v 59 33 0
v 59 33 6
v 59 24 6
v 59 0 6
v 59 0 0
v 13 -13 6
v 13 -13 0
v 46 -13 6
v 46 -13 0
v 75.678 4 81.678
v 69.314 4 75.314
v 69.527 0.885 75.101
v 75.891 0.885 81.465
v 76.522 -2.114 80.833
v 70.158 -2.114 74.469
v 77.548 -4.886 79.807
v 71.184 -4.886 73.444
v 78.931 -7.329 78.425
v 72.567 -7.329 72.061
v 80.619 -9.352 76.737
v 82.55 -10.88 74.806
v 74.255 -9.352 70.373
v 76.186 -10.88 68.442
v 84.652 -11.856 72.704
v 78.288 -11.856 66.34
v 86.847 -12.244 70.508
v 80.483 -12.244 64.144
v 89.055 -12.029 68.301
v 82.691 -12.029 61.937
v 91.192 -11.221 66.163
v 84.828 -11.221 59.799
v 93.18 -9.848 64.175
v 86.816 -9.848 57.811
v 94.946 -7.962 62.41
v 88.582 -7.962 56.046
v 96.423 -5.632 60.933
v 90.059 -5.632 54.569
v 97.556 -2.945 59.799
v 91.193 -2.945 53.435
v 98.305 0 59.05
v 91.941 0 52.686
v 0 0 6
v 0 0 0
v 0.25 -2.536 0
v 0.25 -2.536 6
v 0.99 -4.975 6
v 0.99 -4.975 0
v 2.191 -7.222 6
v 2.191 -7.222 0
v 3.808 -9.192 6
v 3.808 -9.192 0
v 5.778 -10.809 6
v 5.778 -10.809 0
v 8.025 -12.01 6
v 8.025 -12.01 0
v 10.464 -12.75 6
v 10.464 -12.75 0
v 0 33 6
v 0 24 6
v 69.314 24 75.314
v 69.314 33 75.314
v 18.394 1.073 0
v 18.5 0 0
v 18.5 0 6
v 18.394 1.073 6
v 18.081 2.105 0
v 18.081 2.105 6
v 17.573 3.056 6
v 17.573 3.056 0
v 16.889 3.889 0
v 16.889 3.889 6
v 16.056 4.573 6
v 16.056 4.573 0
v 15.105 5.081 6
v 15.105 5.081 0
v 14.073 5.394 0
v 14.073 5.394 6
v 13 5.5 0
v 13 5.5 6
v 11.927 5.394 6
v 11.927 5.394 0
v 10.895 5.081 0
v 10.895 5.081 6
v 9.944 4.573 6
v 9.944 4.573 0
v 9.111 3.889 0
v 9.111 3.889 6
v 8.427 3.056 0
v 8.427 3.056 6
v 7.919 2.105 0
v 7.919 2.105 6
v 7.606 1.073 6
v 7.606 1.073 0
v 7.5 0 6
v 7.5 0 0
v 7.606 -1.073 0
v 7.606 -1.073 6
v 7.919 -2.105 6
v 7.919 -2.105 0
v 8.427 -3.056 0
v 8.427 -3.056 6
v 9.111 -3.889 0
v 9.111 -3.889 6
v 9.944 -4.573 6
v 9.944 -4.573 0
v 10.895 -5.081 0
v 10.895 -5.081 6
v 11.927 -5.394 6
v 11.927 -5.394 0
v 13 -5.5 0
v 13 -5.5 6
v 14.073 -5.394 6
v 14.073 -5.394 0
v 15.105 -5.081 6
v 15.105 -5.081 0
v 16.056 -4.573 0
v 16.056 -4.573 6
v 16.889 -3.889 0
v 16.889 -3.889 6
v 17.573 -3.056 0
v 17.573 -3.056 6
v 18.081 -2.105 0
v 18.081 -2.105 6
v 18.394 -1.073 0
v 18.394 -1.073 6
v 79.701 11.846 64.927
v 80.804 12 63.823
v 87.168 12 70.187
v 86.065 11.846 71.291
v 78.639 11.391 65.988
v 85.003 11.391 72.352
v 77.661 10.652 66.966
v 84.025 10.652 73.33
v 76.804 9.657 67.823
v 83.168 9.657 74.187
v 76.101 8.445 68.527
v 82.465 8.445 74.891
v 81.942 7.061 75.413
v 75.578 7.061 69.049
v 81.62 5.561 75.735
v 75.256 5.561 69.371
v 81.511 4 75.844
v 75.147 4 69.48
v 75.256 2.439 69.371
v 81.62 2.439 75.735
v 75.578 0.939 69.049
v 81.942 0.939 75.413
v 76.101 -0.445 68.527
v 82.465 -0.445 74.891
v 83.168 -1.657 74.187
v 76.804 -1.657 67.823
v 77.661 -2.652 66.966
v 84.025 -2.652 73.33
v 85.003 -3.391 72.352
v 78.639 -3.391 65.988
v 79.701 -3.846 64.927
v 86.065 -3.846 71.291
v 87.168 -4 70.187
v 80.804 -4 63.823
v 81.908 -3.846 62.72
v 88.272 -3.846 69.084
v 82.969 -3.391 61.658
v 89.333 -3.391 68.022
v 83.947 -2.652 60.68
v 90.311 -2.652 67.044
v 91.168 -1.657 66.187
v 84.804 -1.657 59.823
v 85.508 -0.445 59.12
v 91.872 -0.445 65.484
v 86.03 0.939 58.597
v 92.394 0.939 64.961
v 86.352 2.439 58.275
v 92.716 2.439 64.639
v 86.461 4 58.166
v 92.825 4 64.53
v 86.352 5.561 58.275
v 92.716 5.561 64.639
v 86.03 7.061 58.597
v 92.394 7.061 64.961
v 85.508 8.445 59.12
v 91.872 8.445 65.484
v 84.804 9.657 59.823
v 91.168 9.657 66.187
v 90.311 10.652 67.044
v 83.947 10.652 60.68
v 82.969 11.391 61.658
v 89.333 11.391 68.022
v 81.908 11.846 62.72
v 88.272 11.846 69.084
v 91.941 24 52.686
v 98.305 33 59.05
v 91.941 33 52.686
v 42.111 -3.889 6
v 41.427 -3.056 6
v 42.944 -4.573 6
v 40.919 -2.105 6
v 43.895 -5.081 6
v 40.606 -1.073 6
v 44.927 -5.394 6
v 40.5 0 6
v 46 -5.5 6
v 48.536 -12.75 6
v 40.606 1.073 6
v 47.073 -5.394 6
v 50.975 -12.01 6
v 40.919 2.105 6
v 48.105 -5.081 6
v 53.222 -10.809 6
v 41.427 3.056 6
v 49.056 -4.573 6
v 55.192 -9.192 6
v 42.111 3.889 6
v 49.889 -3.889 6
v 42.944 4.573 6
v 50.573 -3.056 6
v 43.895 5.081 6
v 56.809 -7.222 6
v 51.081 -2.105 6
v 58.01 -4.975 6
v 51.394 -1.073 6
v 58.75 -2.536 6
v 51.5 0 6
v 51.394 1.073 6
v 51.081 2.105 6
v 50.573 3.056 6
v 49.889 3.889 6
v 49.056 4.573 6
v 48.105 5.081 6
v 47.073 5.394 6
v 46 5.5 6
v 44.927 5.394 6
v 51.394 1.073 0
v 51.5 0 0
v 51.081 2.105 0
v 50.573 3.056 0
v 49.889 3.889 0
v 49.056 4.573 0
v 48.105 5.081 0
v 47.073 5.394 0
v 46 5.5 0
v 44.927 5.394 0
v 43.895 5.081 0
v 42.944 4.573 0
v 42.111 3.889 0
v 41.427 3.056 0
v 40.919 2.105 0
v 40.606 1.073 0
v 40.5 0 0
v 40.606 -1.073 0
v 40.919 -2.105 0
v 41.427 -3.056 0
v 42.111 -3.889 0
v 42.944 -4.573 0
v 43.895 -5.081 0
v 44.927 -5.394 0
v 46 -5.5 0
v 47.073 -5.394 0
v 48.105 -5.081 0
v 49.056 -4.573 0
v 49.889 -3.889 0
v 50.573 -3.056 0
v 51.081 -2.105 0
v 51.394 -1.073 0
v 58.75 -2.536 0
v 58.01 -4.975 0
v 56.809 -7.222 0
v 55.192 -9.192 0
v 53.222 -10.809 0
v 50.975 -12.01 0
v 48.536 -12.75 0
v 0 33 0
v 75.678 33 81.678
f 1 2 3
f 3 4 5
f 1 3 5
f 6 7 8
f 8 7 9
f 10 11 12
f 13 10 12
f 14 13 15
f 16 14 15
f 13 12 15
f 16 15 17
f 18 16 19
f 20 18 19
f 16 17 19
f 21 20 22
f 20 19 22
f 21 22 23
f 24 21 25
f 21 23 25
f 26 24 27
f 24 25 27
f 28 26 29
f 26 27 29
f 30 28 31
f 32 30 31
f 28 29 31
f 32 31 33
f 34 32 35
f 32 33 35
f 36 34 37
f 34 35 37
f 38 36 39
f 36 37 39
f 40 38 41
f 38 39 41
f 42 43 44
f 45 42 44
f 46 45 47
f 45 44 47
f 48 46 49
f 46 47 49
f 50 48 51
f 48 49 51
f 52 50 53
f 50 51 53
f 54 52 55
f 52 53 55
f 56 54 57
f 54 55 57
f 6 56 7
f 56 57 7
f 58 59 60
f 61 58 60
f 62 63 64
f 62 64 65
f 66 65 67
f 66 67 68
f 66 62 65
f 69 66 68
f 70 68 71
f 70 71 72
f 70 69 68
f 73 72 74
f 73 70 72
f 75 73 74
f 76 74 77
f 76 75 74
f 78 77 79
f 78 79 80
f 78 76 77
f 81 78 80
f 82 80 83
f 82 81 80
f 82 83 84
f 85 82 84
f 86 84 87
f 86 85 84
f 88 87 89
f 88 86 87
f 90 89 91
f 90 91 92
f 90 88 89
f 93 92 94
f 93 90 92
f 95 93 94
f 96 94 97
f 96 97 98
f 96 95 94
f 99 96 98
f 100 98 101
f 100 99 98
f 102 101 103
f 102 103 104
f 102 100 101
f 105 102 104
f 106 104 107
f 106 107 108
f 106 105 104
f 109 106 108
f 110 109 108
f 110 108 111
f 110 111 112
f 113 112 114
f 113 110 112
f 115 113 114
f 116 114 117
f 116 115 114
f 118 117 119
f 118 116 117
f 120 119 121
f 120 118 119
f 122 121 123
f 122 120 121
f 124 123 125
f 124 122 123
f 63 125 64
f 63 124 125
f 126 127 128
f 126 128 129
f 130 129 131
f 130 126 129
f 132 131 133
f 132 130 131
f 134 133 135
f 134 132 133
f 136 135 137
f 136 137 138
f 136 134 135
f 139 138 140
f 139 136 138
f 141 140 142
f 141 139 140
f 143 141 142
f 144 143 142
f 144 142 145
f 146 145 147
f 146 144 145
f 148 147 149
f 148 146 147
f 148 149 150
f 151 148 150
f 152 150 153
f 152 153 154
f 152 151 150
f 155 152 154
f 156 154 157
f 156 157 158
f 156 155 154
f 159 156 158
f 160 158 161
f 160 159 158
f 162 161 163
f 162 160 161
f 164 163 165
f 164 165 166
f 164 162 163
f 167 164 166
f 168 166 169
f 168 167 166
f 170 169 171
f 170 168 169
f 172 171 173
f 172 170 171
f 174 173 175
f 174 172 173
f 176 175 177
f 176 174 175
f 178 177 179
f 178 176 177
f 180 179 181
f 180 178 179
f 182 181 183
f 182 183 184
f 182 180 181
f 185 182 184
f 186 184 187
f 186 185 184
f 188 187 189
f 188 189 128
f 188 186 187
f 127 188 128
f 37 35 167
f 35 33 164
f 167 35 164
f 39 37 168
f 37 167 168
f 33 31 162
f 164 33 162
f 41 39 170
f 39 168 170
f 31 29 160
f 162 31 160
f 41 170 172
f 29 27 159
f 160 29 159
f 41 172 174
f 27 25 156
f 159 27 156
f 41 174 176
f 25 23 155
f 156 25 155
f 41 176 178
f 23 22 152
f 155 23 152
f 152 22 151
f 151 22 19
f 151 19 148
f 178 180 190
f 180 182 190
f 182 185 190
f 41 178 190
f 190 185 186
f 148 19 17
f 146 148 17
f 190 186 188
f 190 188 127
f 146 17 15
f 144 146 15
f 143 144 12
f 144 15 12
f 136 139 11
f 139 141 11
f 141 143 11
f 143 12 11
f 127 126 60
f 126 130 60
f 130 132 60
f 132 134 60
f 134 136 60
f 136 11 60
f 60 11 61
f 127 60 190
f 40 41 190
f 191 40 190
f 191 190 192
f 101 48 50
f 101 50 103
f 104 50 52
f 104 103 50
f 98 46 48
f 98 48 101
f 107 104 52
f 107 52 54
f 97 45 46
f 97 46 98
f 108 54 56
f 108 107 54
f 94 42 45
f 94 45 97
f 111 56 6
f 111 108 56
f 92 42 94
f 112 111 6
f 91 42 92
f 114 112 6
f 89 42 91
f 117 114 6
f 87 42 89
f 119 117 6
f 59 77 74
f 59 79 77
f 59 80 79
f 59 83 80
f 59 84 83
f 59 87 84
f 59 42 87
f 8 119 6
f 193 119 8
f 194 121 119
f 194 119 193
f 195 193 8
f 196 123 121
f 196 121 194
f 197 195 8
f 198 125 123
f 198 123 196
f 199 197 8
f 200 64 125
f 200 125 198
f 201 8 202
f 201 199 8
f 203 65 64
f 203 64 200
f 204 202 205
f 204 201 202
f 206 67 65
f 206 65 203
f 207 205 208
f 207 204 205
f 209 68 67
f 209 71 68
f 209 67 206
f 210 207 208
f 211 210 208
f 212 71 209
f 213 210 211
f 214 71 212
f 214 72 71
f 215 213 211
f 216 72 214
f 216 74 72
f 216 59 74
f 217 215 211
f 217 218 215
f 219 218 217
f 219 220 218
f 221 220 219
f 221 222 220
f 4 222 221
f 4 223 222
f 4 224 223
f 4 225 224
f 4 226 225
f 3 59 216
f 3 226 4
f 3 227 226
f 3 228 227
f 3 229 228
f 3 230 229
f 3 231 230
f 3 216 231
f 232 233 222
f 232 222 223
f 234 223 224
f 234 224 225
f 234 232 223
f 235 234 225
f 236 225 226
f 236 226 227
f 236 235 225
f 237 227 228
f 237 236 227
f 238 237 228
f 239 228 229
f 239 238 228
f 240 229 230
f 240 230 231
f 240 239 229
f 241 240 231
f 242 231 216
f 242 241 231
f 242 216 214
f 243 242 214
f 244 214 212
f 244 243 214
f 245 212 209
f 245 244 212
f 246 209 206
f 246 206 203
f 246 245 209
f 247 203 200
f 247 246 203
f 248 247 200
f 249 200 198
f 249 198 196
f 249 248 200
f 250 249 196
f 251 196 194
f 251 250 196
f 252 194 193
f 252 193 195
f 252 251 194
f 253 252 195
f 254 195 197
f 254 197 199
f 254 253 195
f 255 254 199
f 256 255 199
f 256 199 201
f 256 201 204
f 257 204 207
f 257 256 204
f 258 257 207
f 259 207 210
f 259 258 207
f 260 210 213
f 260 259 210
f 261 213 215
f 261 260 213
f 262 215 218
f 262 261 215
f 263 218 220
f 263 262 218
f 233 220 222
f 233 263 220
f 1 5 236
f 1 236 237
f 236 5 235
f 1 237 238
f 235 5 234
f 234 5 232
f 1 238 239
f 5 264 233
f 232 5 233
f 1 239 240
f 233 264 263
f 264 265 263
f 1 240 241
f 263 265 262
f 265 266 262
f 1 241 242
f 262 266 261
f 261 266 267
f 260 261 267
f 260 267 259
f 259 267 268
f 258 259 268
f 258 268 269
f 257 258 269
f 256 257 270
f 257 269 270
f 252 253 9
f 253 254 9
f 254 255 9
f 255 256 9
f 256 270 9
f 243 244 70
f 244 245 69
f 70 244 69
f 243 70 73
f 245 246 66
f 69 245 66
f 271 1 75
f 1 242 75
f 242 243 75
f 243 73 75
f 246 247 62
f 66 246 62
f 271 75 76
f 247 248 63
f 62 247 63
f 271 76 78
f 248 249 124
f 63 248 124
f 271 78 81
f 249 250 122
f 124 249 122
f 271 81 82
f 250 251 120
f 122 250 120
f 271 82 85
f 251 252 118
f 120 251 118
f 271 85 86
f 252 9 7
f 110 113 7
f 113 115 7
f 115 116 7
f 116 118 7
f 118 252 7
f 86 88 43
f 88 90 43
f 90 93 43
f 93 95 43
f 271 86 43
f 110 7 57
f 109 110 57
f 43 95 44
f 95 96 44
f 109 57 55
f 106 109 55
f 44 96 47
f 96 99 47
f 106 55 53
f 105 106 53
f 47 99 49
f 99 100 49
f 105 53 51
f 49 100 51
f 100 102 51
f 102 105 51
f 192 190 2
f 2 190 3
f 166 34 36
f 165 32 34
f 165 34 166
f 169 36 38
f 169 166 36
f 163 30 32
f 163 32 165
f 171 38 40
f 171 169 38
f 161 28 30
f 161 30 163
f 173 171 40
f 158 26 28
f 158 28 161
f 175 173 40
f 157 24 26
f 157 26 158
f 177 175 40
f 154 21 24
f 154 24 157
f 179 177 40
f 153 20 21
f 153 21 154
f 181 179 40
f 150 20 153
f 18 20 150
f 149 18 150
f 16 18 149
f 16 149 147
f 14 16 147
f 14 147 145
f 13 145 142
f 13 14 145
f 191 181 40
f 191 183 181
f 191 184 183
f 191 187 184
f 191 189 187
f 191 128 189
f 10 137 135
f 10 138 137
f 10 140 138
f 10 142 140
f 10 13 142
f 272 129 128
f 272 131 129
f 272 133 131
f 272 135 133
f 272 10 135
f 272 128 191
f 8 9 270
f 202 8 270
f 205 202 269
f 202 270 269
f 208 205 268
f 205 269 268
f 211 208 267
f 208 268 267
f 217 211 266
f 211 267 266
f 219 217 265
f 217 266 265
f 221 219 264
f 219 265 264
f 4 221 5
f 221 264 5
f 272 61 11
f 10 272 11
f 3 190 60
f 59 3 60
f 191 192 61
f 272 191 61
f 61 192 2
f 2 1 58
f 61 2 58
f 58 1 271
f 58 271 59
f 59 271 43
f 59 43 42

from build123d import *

# Parameters (mm, degrees)
F0_R     = 5.5
F1_DEPTH = 6
F3_DEPTH = 9
F4_R     = 8
F5_DEPTH = 9


with BuildPart() as f1:
    # F0 (on Top) → F1 (new body)
    with BuildSketch(Plane.XY):
        with BuildLine():
            Line((59, 24), (0, 24))
            Line((0, 24), (0, 0))
            ThreePointArc((0, 0), (3.807612, -9.192388), (13, -13))
            Line((13, -13), (46, -13))
            ThreePointArc((46, -13), (55.192388, -9.192388), (59, 0))
            Line((59, 0), (59, 24))
        make_face()
        with Locations((13, 0)):
            Circle(F0_R, mode=Mode.SUBTRACT)
        with Locations((46, 0)):
            Circle(F0_R, mode=Mode.SUBTRACT)
    extrude(amount=F1_DEPTH)

    # F2 (on face) → F3 (join)
    with BuildSketch(Plane(origin=(0, 24, 0), x_dir=(-1, 0, 0), z_dir=(0, 1, 0))):
        Polygon((-91.941125, 52.686292), (-59, 6), (-59, 0), (0, 0), (0, 6), (-69.313708, 75.313708), align=None)
    extrude(amount=F3_DEPTH)

    # F4 (on face) → F5 (join)
    with BuildSketch(Plane(origin=(72.313708, 0, 72.313708), x_dir=(0, 1, 0), z_dir=(0.707107, 0, 0.707107))):
        with BuildLine():
            Line((33, 4.242641), (4, 4.242641))
            ThreePointArc((4, 4.242641), (-12.124515, -9.991795), (0, -27.757359))
            Line((0, -27.757359), (33, -27.757359))
            Line((33, -27.757359), (33, 4.242641))
        make_face()
        with Locations((4, -12.007359)):
            Circle(F4_R, mode=Mode.SUBTRACT)
    extrude(amount=F5_DEPTH)


solid = f1.part
